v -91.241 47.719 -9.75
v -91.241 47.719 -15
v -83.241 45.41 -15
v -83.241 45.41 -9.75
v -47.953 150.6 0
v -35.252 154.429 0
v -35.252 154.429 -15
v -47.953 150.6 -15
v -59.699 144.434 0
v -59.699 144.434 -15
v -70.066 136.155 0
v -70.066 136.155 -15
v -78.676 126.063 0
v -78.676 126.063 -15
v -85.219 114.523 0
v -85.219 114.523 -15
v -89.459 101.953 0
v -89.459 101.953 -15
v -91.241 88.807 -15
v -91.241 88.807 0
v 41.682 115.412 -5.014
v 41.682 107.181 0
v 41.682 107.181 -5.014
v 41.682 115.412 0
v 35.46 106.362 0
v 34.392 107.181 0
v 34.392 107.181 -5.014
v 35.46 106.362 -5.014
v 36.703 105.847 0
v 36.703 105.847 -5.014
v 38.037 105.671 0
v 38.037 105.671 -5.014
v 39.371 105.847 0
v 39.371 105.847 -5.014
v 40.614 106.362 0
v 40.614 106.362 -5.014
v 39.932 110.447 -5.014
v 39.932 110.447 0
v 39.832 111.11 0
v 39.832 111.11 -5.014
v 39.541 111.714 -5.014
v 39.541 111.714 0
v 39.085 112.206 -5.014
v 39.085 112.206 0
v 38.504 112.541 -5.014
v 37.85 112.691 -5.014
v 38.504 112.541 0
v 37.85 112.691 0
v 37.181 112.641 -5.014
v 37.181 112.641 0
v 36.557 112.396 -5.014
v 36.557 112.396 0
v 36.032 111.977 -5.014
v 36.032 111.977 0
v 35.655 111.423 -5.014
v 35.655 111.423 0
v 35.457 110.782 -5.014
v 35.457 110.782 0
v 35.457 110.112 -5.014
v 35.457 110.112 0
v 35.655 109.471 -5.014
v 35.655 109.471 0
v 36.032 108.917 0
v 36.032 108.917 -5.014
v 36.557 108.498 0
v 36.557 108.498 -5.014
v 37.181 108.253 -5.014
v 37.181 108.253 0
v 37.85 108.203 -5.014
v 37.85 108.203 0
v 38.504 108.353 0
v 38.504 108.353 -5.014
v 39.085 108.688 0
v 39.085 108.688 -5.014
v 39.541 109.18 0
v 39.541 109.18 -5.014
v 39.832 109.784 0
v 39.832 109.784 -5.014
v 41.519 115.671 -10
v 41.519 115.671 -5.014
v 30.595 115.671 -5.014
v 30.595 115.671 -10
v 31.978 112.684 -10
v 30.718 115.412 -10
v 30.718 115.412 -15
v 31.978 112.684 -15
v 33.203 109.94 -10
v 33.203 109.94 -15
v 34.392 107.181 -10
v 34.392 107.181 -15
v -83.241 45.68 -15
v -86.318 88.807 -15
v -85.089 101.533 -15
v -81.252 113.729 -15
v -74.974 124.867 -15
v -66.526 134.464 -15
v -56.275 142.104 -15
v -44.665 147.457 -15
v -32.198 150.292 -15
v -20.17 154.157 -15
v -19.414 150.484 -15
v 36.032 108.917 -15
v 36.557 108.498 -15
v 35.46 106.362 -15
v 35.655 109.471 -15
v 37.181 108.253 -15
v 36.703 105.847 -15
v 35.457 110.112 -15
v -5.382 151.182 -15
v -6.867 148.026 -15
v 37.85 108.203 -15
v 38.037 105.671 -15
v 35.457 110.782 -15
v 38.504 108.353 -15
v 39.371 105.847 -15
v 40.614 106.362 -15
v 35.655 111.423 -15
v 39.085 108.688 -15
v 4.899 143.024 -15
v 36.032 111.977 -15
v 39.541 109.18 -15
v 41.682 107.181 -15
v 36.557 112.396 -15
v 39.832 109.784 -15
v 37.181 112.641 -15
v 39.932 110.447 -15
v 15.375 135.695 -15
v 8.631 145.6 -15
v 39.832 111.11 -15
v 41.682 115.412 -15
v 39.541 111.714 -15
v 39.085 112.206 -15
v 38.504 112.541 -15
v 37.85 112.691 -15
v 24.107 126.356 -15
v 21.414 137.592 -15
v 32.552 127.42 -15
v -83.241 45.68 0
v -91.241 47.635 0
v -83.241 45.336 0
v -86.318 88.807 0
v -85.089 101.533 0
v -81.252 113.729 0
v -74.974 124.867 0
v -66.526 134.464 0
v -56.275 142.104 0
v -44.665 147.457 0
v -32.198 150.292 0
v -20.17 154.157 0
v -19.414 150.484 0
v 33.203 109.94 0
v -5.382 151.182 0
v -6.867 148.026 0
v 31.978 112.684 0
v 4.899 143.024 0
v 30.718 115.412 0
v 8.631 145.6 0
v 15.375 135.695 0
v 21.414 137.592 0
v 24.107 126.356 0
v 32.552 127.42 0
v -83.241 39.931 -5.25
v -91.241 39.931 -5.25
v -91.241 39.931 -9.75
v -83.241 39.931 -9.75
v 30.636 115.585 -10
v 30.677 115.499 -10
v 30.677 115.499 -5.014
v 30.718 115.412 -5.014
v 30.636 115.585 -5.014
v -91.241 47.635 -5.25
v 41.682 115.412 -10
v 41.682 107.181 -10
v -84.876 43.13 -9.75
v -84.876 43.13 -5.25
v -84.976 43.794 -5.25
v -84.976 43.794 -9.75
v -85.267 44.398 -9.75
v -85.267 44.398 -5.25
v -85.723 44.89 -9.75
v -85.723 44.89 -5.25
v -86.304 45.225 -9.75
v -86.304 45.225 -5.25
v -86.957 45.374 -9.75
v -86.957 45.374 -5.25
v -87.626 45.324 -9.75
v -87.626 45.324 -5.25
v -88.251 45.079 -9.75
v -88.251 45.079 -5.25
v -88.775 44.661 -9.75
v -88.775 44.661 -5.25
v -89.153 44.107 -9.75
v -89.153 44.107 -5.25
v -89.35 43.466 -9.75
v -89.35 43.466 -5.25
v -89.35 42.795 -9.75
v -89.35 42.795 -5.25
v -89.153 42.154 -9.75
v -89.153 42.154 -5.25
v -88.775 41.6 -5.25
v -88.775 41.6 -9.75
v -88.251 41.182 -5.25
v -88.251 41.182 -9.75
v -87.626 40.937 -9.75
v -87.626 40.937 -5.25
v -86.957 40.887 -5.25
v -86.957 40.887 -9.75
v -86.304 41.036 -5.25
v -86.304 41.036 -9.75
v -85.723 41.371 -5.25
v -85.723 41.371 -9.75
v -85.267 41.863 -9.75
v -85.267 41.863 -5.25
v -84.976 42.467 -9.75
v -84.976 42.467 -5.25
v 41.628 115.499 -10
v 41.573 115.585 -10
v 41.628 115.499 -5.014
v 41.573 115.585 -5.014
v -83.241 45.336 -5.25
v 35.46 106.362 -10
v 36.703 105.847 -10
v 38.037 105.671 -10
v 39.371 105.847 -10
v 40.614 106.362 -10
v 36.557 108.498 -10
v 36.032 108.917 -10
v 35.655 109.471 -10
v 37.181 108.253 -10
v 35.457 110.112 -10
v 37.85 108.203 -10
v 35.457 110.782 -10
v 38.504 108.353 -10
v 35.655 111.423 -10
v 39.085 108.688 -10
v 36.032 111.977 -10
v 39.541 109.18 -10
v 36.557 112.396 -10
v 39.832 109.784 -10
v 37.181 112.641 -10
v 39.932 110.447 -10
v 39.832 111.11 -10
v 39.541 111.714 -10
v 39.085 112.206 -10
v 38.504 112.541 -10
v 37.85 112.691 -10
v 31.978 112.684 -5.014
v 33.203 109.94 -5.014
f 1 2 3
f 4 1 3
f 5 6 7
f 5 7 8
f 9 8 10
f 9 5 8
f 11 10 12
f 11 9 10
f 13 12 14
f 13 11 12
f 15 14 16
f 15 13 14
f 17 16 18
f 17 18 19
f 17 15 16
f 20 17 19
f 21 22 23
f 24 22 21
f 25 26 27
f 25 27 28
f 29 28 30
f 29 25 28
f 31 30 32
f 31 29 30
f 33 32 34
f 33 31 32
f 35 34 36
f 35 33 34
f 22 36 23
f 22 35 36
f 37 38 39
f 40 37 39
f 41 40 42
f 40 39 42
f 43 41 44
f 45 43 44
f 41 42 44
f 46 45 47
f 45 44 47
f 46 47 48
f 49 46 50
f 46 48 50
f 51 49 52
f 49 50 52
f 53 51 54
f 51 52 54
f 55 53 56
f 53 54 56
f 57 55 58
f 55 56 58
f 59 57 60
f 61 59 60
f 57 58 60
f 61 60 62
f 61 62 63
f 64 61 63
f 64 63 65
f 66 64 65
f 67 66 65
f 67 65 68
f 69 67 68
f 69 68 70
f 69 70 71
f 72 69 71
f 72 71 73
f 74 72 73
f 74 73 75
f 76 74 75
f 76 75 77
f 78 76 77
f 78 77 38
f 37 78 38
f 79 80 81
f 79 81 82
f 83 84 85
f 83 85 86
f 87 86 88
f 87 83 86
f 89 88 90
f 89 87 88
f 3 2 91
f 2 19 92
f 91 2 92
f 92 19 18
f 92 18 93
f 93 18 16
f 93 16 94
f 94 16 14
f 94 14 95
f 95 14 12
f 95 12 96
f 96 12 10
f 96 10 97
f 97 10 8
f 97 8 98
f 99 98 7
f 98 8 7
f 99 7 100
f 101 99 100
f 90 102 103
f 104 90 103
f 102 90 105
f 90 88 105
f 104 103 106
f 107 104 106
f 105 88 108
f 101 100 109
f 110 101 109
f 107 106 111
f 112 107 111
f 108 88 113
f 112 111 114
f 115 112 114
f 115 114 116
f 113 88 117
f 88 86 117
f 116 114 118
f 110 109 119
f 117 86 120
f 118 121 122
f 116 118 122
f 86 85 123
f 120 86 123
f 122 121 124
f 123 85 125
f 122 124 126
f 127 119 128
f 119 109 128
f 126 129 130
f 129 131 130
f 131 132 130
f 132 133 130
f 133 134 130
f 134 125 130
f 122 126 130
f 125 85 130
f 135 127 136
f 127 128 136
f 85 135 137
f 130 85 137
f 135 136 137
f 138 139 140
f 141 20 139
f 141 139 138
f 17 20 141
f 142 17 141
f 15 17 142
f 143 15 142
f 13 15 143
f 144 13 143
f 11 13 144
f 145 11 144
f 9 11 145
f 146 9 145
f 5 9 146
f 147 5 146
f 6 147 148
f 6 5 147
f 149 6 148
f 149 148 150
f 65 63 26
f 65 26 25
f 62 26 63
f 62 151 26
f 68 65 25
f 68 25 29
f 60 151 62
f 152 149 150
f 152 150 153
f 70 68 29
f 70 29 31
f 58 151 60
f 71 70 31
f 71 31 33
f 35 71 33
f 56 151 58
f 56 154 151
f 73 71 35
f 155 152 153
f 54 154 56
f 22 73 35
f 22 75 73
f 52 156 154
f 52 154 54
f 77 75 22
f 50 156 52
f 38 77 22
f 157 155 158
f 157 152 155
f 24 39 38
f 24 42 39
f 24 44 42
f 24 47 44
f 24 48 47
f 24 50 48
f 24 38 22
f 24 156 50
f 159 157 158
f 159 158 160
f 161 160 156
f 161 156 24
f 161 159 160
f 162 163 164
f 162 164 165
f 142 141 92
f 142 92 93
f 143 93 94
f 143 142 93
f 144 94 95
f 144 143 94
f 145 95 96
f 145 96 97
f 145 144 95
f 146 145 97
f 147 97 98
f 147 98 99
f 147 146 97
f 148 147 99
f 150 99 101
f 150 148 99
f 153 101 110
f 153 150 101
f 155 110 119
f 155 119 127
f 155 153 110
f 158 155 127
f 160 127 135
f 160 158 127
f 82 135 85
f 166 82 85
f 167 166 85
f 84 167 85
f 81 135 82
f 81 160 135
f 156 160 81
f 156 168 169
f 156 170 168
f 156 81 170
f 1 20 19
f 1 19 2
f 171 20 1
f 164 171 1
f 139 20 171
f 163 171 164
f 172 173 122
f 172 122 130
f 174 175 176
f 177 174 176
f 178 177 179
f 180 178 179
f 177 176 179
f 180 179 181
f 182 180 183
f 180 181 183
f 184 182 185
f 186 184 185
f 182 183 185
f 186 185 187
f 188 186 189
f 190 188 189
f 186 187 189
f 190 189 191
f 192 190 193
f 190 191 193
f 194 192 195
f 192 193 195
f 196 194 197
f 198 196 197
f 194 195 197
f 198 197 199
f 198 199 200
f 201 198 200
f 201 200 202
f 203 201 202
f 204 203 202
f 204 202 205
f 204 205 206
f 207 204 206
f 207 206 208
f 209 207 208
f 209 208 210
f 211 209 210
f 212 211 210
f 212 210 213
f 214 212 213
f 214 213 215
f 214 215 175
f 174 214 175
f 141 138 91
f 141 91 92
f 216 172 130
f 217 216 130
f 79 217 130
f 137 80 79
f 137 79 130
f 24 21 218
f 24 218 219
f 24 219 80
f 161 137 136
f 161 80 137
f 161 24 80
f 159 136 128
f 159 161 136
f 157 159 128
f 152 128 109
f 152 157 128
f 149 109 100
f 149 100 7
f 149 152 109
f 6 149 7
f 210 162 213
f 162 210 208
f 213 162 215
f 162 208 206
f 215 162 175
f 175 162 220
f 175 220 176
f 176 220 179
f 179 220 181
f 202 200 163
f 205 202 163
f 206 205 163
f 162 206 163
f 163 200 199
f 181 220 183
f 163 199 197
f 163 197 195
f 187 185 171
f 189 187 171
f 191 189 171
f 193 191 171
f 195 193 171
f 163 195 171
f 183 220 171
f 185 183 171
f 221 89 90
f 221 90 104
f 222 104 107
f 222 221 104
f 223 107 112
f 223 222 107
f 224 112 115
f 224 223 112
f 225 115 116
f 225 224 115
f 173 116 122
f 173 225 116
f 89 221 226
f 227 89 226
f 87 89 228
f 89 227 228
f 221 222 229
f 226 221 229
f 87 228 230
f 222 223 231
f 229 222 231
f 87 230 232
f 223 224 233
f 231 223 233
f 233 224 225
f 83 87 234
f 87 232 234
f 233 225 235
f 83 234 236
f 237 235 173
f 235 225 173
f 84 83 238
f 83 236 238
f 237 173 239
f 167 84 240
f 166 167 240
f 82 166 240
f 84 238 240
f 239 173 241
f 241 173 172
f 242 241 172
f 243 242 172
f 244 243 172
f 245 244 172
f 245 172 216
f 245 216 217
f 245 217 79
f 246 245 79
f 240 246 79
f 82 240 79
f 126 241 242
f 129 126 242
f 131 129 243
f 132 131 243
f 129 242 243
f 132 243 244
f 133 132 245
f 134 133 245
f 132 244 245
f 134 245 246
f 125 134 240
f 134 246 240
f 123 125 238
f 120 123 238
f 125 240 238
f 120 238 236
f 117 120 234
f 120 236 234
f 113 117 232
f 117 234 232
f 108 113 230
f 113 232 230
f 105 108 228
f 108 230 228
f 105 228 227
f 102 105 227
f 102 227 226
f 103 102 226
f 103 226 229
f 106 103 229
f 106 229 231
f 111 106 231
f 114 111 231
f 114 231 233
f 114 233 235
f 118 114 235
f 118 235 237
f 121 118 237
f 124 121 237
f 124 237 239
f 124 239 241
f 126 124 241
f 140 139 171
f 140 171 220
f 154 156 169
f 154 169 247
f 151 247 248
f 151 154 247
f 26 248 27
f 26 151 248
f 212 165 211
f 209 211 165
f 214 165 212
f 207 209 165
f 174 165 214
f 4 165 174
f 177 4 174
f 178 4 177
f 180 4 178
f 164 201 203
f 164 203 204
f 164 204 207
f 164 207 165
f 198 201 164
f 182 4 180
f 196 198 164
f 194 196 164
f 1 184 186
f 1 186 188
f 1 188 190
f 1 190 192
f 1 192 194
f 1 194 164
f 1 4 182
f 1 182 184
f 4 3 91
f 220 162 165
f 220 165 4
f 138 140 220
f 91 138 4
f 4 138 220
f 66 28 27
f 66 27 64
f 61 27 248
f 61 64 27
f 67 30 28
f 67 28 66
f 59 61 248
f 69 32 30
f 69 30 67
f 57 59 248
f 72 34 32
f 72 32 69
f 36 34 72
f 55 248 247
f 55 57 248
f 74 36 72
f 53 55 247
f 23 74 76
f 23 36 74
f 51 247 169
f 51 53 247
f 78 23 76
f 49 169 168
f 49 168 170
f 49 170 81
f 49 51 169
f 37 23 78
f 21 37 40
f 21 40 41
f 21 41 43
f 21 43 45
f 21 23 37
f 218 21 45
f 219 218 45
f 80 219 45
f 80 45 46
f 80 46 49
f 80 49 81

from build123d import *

# Parameters (mm, degrees)
SKETCH3_R           = 2.25
BOSS_EXTRUDE1_DEPTH = 15
CUT_EXTRUDE2_DEPTH  = 5.25
CUT_EXTRUDE3_DEPTH  = 5.25
SKETCH9_W           = 4.986330716
SKETCH9_H           = 10
CUT_EXTRUDE4_DEPTH  = 20


with BuildPart() as part:
    # Sketch3 → Boss-Extrude1 (new body)
    with BuildSketch(Plane.XY):
        with BuildLine():
            Line((-83.240837696, 45.680087808), (-86.318243263, 88.806933971))
            ThreePointArc((-86.318243263, 88.806933971), (-38.505178909, 149.199689366), (30.717635907, 115.412473794))
            ThreePointArc((30.717635907, 115.412473794), (32.594544712, 111.314313071), (34.392132503, 107.180744866))
            ThreePointArc((34.392132503, 107.180744866), (38.03694462, 105.671014255), (41.681756737, 107.180744866))
            Line((41.681756737, 107.180744866), (41.681756737, 115.412473794))
            ThreePointArc((41.681756737, 115.412473794), (8.630903534, 145.599759454), (-35.251645513, 154.428859194))
            ThreePointArc((-35.251645513, 154.428859194), (-74.611345825, 131.314701457), (-91.240837696, 88.806933971))
            Line((-91.240837696, 88.806933971), (-91.240837696, 47.654450262))
            Line((-91.240837696, 47.654450262), (-91.240837696, 39.931378559))
            Line((-91.240837696, 39.931378559), (-83.240837696, 39.931378559))
            Line((-83.240837696, 39.931378559), (-83.240837696, 45.680087808))
        make_face()
        with Locations((-87.125618482, 43.130480477)):
            Circle(SKETCH3_R, mode=Mode.SUBTRACT)
        with Locations((37.681756737, 110.446980465)):
            Circle(SKETCH3_R, mode=Mode.SUBTRACT)
    extrude(amount=-BOSS_EXTRUDE1_DEPTH)

    # Sketch5 → Cut-Extrude2 (cut)
    with BuildSketch(Plane.XY):
        Polygon((-91.240837696, 47.634728669), (-83.240837696, 45.336049347), (-83.240837696, 39.931378559), (-91.240837696, 39.931378559), align=None)
    extrude(amount=-CUT_EXTRUDE2_DEPTH, mode=Mode.SUBTRACT)

    # Sketch8 → Cut-Extrude3 (cut)
    with BuildSketch(Plane(origin=(0, 0, -15), x_dir=(-1, 0, 0), z_dir=(0, 0, -1))):
        Polygon((91.240837696, 47.718881947), (83.240837696, 45.410478658), (83.240837696, 39.931378559), (91.240837696, 39.931378559), align=None)
    extrude(amount=-CUT_EXTRUDE3_DEPTH, mode=Mode.SUBTRACT)

    # Sketch9 → Cut-Extrude4 (cut)
    with BuildSketch(Plane(origin=(41.681756737, 0, 0), x_dir=(0, 0, -1), z_dir=(1, 0, 0))):
        with Locations((7.506834642, 110.671014255)):
            Rectangle(SKETCH9_W, SKETCH9_H)
    extrude(amount=-CUT_EXTRUDE4_DEPTH, mode=Mode.SUBTRACT)


solid = part.part
